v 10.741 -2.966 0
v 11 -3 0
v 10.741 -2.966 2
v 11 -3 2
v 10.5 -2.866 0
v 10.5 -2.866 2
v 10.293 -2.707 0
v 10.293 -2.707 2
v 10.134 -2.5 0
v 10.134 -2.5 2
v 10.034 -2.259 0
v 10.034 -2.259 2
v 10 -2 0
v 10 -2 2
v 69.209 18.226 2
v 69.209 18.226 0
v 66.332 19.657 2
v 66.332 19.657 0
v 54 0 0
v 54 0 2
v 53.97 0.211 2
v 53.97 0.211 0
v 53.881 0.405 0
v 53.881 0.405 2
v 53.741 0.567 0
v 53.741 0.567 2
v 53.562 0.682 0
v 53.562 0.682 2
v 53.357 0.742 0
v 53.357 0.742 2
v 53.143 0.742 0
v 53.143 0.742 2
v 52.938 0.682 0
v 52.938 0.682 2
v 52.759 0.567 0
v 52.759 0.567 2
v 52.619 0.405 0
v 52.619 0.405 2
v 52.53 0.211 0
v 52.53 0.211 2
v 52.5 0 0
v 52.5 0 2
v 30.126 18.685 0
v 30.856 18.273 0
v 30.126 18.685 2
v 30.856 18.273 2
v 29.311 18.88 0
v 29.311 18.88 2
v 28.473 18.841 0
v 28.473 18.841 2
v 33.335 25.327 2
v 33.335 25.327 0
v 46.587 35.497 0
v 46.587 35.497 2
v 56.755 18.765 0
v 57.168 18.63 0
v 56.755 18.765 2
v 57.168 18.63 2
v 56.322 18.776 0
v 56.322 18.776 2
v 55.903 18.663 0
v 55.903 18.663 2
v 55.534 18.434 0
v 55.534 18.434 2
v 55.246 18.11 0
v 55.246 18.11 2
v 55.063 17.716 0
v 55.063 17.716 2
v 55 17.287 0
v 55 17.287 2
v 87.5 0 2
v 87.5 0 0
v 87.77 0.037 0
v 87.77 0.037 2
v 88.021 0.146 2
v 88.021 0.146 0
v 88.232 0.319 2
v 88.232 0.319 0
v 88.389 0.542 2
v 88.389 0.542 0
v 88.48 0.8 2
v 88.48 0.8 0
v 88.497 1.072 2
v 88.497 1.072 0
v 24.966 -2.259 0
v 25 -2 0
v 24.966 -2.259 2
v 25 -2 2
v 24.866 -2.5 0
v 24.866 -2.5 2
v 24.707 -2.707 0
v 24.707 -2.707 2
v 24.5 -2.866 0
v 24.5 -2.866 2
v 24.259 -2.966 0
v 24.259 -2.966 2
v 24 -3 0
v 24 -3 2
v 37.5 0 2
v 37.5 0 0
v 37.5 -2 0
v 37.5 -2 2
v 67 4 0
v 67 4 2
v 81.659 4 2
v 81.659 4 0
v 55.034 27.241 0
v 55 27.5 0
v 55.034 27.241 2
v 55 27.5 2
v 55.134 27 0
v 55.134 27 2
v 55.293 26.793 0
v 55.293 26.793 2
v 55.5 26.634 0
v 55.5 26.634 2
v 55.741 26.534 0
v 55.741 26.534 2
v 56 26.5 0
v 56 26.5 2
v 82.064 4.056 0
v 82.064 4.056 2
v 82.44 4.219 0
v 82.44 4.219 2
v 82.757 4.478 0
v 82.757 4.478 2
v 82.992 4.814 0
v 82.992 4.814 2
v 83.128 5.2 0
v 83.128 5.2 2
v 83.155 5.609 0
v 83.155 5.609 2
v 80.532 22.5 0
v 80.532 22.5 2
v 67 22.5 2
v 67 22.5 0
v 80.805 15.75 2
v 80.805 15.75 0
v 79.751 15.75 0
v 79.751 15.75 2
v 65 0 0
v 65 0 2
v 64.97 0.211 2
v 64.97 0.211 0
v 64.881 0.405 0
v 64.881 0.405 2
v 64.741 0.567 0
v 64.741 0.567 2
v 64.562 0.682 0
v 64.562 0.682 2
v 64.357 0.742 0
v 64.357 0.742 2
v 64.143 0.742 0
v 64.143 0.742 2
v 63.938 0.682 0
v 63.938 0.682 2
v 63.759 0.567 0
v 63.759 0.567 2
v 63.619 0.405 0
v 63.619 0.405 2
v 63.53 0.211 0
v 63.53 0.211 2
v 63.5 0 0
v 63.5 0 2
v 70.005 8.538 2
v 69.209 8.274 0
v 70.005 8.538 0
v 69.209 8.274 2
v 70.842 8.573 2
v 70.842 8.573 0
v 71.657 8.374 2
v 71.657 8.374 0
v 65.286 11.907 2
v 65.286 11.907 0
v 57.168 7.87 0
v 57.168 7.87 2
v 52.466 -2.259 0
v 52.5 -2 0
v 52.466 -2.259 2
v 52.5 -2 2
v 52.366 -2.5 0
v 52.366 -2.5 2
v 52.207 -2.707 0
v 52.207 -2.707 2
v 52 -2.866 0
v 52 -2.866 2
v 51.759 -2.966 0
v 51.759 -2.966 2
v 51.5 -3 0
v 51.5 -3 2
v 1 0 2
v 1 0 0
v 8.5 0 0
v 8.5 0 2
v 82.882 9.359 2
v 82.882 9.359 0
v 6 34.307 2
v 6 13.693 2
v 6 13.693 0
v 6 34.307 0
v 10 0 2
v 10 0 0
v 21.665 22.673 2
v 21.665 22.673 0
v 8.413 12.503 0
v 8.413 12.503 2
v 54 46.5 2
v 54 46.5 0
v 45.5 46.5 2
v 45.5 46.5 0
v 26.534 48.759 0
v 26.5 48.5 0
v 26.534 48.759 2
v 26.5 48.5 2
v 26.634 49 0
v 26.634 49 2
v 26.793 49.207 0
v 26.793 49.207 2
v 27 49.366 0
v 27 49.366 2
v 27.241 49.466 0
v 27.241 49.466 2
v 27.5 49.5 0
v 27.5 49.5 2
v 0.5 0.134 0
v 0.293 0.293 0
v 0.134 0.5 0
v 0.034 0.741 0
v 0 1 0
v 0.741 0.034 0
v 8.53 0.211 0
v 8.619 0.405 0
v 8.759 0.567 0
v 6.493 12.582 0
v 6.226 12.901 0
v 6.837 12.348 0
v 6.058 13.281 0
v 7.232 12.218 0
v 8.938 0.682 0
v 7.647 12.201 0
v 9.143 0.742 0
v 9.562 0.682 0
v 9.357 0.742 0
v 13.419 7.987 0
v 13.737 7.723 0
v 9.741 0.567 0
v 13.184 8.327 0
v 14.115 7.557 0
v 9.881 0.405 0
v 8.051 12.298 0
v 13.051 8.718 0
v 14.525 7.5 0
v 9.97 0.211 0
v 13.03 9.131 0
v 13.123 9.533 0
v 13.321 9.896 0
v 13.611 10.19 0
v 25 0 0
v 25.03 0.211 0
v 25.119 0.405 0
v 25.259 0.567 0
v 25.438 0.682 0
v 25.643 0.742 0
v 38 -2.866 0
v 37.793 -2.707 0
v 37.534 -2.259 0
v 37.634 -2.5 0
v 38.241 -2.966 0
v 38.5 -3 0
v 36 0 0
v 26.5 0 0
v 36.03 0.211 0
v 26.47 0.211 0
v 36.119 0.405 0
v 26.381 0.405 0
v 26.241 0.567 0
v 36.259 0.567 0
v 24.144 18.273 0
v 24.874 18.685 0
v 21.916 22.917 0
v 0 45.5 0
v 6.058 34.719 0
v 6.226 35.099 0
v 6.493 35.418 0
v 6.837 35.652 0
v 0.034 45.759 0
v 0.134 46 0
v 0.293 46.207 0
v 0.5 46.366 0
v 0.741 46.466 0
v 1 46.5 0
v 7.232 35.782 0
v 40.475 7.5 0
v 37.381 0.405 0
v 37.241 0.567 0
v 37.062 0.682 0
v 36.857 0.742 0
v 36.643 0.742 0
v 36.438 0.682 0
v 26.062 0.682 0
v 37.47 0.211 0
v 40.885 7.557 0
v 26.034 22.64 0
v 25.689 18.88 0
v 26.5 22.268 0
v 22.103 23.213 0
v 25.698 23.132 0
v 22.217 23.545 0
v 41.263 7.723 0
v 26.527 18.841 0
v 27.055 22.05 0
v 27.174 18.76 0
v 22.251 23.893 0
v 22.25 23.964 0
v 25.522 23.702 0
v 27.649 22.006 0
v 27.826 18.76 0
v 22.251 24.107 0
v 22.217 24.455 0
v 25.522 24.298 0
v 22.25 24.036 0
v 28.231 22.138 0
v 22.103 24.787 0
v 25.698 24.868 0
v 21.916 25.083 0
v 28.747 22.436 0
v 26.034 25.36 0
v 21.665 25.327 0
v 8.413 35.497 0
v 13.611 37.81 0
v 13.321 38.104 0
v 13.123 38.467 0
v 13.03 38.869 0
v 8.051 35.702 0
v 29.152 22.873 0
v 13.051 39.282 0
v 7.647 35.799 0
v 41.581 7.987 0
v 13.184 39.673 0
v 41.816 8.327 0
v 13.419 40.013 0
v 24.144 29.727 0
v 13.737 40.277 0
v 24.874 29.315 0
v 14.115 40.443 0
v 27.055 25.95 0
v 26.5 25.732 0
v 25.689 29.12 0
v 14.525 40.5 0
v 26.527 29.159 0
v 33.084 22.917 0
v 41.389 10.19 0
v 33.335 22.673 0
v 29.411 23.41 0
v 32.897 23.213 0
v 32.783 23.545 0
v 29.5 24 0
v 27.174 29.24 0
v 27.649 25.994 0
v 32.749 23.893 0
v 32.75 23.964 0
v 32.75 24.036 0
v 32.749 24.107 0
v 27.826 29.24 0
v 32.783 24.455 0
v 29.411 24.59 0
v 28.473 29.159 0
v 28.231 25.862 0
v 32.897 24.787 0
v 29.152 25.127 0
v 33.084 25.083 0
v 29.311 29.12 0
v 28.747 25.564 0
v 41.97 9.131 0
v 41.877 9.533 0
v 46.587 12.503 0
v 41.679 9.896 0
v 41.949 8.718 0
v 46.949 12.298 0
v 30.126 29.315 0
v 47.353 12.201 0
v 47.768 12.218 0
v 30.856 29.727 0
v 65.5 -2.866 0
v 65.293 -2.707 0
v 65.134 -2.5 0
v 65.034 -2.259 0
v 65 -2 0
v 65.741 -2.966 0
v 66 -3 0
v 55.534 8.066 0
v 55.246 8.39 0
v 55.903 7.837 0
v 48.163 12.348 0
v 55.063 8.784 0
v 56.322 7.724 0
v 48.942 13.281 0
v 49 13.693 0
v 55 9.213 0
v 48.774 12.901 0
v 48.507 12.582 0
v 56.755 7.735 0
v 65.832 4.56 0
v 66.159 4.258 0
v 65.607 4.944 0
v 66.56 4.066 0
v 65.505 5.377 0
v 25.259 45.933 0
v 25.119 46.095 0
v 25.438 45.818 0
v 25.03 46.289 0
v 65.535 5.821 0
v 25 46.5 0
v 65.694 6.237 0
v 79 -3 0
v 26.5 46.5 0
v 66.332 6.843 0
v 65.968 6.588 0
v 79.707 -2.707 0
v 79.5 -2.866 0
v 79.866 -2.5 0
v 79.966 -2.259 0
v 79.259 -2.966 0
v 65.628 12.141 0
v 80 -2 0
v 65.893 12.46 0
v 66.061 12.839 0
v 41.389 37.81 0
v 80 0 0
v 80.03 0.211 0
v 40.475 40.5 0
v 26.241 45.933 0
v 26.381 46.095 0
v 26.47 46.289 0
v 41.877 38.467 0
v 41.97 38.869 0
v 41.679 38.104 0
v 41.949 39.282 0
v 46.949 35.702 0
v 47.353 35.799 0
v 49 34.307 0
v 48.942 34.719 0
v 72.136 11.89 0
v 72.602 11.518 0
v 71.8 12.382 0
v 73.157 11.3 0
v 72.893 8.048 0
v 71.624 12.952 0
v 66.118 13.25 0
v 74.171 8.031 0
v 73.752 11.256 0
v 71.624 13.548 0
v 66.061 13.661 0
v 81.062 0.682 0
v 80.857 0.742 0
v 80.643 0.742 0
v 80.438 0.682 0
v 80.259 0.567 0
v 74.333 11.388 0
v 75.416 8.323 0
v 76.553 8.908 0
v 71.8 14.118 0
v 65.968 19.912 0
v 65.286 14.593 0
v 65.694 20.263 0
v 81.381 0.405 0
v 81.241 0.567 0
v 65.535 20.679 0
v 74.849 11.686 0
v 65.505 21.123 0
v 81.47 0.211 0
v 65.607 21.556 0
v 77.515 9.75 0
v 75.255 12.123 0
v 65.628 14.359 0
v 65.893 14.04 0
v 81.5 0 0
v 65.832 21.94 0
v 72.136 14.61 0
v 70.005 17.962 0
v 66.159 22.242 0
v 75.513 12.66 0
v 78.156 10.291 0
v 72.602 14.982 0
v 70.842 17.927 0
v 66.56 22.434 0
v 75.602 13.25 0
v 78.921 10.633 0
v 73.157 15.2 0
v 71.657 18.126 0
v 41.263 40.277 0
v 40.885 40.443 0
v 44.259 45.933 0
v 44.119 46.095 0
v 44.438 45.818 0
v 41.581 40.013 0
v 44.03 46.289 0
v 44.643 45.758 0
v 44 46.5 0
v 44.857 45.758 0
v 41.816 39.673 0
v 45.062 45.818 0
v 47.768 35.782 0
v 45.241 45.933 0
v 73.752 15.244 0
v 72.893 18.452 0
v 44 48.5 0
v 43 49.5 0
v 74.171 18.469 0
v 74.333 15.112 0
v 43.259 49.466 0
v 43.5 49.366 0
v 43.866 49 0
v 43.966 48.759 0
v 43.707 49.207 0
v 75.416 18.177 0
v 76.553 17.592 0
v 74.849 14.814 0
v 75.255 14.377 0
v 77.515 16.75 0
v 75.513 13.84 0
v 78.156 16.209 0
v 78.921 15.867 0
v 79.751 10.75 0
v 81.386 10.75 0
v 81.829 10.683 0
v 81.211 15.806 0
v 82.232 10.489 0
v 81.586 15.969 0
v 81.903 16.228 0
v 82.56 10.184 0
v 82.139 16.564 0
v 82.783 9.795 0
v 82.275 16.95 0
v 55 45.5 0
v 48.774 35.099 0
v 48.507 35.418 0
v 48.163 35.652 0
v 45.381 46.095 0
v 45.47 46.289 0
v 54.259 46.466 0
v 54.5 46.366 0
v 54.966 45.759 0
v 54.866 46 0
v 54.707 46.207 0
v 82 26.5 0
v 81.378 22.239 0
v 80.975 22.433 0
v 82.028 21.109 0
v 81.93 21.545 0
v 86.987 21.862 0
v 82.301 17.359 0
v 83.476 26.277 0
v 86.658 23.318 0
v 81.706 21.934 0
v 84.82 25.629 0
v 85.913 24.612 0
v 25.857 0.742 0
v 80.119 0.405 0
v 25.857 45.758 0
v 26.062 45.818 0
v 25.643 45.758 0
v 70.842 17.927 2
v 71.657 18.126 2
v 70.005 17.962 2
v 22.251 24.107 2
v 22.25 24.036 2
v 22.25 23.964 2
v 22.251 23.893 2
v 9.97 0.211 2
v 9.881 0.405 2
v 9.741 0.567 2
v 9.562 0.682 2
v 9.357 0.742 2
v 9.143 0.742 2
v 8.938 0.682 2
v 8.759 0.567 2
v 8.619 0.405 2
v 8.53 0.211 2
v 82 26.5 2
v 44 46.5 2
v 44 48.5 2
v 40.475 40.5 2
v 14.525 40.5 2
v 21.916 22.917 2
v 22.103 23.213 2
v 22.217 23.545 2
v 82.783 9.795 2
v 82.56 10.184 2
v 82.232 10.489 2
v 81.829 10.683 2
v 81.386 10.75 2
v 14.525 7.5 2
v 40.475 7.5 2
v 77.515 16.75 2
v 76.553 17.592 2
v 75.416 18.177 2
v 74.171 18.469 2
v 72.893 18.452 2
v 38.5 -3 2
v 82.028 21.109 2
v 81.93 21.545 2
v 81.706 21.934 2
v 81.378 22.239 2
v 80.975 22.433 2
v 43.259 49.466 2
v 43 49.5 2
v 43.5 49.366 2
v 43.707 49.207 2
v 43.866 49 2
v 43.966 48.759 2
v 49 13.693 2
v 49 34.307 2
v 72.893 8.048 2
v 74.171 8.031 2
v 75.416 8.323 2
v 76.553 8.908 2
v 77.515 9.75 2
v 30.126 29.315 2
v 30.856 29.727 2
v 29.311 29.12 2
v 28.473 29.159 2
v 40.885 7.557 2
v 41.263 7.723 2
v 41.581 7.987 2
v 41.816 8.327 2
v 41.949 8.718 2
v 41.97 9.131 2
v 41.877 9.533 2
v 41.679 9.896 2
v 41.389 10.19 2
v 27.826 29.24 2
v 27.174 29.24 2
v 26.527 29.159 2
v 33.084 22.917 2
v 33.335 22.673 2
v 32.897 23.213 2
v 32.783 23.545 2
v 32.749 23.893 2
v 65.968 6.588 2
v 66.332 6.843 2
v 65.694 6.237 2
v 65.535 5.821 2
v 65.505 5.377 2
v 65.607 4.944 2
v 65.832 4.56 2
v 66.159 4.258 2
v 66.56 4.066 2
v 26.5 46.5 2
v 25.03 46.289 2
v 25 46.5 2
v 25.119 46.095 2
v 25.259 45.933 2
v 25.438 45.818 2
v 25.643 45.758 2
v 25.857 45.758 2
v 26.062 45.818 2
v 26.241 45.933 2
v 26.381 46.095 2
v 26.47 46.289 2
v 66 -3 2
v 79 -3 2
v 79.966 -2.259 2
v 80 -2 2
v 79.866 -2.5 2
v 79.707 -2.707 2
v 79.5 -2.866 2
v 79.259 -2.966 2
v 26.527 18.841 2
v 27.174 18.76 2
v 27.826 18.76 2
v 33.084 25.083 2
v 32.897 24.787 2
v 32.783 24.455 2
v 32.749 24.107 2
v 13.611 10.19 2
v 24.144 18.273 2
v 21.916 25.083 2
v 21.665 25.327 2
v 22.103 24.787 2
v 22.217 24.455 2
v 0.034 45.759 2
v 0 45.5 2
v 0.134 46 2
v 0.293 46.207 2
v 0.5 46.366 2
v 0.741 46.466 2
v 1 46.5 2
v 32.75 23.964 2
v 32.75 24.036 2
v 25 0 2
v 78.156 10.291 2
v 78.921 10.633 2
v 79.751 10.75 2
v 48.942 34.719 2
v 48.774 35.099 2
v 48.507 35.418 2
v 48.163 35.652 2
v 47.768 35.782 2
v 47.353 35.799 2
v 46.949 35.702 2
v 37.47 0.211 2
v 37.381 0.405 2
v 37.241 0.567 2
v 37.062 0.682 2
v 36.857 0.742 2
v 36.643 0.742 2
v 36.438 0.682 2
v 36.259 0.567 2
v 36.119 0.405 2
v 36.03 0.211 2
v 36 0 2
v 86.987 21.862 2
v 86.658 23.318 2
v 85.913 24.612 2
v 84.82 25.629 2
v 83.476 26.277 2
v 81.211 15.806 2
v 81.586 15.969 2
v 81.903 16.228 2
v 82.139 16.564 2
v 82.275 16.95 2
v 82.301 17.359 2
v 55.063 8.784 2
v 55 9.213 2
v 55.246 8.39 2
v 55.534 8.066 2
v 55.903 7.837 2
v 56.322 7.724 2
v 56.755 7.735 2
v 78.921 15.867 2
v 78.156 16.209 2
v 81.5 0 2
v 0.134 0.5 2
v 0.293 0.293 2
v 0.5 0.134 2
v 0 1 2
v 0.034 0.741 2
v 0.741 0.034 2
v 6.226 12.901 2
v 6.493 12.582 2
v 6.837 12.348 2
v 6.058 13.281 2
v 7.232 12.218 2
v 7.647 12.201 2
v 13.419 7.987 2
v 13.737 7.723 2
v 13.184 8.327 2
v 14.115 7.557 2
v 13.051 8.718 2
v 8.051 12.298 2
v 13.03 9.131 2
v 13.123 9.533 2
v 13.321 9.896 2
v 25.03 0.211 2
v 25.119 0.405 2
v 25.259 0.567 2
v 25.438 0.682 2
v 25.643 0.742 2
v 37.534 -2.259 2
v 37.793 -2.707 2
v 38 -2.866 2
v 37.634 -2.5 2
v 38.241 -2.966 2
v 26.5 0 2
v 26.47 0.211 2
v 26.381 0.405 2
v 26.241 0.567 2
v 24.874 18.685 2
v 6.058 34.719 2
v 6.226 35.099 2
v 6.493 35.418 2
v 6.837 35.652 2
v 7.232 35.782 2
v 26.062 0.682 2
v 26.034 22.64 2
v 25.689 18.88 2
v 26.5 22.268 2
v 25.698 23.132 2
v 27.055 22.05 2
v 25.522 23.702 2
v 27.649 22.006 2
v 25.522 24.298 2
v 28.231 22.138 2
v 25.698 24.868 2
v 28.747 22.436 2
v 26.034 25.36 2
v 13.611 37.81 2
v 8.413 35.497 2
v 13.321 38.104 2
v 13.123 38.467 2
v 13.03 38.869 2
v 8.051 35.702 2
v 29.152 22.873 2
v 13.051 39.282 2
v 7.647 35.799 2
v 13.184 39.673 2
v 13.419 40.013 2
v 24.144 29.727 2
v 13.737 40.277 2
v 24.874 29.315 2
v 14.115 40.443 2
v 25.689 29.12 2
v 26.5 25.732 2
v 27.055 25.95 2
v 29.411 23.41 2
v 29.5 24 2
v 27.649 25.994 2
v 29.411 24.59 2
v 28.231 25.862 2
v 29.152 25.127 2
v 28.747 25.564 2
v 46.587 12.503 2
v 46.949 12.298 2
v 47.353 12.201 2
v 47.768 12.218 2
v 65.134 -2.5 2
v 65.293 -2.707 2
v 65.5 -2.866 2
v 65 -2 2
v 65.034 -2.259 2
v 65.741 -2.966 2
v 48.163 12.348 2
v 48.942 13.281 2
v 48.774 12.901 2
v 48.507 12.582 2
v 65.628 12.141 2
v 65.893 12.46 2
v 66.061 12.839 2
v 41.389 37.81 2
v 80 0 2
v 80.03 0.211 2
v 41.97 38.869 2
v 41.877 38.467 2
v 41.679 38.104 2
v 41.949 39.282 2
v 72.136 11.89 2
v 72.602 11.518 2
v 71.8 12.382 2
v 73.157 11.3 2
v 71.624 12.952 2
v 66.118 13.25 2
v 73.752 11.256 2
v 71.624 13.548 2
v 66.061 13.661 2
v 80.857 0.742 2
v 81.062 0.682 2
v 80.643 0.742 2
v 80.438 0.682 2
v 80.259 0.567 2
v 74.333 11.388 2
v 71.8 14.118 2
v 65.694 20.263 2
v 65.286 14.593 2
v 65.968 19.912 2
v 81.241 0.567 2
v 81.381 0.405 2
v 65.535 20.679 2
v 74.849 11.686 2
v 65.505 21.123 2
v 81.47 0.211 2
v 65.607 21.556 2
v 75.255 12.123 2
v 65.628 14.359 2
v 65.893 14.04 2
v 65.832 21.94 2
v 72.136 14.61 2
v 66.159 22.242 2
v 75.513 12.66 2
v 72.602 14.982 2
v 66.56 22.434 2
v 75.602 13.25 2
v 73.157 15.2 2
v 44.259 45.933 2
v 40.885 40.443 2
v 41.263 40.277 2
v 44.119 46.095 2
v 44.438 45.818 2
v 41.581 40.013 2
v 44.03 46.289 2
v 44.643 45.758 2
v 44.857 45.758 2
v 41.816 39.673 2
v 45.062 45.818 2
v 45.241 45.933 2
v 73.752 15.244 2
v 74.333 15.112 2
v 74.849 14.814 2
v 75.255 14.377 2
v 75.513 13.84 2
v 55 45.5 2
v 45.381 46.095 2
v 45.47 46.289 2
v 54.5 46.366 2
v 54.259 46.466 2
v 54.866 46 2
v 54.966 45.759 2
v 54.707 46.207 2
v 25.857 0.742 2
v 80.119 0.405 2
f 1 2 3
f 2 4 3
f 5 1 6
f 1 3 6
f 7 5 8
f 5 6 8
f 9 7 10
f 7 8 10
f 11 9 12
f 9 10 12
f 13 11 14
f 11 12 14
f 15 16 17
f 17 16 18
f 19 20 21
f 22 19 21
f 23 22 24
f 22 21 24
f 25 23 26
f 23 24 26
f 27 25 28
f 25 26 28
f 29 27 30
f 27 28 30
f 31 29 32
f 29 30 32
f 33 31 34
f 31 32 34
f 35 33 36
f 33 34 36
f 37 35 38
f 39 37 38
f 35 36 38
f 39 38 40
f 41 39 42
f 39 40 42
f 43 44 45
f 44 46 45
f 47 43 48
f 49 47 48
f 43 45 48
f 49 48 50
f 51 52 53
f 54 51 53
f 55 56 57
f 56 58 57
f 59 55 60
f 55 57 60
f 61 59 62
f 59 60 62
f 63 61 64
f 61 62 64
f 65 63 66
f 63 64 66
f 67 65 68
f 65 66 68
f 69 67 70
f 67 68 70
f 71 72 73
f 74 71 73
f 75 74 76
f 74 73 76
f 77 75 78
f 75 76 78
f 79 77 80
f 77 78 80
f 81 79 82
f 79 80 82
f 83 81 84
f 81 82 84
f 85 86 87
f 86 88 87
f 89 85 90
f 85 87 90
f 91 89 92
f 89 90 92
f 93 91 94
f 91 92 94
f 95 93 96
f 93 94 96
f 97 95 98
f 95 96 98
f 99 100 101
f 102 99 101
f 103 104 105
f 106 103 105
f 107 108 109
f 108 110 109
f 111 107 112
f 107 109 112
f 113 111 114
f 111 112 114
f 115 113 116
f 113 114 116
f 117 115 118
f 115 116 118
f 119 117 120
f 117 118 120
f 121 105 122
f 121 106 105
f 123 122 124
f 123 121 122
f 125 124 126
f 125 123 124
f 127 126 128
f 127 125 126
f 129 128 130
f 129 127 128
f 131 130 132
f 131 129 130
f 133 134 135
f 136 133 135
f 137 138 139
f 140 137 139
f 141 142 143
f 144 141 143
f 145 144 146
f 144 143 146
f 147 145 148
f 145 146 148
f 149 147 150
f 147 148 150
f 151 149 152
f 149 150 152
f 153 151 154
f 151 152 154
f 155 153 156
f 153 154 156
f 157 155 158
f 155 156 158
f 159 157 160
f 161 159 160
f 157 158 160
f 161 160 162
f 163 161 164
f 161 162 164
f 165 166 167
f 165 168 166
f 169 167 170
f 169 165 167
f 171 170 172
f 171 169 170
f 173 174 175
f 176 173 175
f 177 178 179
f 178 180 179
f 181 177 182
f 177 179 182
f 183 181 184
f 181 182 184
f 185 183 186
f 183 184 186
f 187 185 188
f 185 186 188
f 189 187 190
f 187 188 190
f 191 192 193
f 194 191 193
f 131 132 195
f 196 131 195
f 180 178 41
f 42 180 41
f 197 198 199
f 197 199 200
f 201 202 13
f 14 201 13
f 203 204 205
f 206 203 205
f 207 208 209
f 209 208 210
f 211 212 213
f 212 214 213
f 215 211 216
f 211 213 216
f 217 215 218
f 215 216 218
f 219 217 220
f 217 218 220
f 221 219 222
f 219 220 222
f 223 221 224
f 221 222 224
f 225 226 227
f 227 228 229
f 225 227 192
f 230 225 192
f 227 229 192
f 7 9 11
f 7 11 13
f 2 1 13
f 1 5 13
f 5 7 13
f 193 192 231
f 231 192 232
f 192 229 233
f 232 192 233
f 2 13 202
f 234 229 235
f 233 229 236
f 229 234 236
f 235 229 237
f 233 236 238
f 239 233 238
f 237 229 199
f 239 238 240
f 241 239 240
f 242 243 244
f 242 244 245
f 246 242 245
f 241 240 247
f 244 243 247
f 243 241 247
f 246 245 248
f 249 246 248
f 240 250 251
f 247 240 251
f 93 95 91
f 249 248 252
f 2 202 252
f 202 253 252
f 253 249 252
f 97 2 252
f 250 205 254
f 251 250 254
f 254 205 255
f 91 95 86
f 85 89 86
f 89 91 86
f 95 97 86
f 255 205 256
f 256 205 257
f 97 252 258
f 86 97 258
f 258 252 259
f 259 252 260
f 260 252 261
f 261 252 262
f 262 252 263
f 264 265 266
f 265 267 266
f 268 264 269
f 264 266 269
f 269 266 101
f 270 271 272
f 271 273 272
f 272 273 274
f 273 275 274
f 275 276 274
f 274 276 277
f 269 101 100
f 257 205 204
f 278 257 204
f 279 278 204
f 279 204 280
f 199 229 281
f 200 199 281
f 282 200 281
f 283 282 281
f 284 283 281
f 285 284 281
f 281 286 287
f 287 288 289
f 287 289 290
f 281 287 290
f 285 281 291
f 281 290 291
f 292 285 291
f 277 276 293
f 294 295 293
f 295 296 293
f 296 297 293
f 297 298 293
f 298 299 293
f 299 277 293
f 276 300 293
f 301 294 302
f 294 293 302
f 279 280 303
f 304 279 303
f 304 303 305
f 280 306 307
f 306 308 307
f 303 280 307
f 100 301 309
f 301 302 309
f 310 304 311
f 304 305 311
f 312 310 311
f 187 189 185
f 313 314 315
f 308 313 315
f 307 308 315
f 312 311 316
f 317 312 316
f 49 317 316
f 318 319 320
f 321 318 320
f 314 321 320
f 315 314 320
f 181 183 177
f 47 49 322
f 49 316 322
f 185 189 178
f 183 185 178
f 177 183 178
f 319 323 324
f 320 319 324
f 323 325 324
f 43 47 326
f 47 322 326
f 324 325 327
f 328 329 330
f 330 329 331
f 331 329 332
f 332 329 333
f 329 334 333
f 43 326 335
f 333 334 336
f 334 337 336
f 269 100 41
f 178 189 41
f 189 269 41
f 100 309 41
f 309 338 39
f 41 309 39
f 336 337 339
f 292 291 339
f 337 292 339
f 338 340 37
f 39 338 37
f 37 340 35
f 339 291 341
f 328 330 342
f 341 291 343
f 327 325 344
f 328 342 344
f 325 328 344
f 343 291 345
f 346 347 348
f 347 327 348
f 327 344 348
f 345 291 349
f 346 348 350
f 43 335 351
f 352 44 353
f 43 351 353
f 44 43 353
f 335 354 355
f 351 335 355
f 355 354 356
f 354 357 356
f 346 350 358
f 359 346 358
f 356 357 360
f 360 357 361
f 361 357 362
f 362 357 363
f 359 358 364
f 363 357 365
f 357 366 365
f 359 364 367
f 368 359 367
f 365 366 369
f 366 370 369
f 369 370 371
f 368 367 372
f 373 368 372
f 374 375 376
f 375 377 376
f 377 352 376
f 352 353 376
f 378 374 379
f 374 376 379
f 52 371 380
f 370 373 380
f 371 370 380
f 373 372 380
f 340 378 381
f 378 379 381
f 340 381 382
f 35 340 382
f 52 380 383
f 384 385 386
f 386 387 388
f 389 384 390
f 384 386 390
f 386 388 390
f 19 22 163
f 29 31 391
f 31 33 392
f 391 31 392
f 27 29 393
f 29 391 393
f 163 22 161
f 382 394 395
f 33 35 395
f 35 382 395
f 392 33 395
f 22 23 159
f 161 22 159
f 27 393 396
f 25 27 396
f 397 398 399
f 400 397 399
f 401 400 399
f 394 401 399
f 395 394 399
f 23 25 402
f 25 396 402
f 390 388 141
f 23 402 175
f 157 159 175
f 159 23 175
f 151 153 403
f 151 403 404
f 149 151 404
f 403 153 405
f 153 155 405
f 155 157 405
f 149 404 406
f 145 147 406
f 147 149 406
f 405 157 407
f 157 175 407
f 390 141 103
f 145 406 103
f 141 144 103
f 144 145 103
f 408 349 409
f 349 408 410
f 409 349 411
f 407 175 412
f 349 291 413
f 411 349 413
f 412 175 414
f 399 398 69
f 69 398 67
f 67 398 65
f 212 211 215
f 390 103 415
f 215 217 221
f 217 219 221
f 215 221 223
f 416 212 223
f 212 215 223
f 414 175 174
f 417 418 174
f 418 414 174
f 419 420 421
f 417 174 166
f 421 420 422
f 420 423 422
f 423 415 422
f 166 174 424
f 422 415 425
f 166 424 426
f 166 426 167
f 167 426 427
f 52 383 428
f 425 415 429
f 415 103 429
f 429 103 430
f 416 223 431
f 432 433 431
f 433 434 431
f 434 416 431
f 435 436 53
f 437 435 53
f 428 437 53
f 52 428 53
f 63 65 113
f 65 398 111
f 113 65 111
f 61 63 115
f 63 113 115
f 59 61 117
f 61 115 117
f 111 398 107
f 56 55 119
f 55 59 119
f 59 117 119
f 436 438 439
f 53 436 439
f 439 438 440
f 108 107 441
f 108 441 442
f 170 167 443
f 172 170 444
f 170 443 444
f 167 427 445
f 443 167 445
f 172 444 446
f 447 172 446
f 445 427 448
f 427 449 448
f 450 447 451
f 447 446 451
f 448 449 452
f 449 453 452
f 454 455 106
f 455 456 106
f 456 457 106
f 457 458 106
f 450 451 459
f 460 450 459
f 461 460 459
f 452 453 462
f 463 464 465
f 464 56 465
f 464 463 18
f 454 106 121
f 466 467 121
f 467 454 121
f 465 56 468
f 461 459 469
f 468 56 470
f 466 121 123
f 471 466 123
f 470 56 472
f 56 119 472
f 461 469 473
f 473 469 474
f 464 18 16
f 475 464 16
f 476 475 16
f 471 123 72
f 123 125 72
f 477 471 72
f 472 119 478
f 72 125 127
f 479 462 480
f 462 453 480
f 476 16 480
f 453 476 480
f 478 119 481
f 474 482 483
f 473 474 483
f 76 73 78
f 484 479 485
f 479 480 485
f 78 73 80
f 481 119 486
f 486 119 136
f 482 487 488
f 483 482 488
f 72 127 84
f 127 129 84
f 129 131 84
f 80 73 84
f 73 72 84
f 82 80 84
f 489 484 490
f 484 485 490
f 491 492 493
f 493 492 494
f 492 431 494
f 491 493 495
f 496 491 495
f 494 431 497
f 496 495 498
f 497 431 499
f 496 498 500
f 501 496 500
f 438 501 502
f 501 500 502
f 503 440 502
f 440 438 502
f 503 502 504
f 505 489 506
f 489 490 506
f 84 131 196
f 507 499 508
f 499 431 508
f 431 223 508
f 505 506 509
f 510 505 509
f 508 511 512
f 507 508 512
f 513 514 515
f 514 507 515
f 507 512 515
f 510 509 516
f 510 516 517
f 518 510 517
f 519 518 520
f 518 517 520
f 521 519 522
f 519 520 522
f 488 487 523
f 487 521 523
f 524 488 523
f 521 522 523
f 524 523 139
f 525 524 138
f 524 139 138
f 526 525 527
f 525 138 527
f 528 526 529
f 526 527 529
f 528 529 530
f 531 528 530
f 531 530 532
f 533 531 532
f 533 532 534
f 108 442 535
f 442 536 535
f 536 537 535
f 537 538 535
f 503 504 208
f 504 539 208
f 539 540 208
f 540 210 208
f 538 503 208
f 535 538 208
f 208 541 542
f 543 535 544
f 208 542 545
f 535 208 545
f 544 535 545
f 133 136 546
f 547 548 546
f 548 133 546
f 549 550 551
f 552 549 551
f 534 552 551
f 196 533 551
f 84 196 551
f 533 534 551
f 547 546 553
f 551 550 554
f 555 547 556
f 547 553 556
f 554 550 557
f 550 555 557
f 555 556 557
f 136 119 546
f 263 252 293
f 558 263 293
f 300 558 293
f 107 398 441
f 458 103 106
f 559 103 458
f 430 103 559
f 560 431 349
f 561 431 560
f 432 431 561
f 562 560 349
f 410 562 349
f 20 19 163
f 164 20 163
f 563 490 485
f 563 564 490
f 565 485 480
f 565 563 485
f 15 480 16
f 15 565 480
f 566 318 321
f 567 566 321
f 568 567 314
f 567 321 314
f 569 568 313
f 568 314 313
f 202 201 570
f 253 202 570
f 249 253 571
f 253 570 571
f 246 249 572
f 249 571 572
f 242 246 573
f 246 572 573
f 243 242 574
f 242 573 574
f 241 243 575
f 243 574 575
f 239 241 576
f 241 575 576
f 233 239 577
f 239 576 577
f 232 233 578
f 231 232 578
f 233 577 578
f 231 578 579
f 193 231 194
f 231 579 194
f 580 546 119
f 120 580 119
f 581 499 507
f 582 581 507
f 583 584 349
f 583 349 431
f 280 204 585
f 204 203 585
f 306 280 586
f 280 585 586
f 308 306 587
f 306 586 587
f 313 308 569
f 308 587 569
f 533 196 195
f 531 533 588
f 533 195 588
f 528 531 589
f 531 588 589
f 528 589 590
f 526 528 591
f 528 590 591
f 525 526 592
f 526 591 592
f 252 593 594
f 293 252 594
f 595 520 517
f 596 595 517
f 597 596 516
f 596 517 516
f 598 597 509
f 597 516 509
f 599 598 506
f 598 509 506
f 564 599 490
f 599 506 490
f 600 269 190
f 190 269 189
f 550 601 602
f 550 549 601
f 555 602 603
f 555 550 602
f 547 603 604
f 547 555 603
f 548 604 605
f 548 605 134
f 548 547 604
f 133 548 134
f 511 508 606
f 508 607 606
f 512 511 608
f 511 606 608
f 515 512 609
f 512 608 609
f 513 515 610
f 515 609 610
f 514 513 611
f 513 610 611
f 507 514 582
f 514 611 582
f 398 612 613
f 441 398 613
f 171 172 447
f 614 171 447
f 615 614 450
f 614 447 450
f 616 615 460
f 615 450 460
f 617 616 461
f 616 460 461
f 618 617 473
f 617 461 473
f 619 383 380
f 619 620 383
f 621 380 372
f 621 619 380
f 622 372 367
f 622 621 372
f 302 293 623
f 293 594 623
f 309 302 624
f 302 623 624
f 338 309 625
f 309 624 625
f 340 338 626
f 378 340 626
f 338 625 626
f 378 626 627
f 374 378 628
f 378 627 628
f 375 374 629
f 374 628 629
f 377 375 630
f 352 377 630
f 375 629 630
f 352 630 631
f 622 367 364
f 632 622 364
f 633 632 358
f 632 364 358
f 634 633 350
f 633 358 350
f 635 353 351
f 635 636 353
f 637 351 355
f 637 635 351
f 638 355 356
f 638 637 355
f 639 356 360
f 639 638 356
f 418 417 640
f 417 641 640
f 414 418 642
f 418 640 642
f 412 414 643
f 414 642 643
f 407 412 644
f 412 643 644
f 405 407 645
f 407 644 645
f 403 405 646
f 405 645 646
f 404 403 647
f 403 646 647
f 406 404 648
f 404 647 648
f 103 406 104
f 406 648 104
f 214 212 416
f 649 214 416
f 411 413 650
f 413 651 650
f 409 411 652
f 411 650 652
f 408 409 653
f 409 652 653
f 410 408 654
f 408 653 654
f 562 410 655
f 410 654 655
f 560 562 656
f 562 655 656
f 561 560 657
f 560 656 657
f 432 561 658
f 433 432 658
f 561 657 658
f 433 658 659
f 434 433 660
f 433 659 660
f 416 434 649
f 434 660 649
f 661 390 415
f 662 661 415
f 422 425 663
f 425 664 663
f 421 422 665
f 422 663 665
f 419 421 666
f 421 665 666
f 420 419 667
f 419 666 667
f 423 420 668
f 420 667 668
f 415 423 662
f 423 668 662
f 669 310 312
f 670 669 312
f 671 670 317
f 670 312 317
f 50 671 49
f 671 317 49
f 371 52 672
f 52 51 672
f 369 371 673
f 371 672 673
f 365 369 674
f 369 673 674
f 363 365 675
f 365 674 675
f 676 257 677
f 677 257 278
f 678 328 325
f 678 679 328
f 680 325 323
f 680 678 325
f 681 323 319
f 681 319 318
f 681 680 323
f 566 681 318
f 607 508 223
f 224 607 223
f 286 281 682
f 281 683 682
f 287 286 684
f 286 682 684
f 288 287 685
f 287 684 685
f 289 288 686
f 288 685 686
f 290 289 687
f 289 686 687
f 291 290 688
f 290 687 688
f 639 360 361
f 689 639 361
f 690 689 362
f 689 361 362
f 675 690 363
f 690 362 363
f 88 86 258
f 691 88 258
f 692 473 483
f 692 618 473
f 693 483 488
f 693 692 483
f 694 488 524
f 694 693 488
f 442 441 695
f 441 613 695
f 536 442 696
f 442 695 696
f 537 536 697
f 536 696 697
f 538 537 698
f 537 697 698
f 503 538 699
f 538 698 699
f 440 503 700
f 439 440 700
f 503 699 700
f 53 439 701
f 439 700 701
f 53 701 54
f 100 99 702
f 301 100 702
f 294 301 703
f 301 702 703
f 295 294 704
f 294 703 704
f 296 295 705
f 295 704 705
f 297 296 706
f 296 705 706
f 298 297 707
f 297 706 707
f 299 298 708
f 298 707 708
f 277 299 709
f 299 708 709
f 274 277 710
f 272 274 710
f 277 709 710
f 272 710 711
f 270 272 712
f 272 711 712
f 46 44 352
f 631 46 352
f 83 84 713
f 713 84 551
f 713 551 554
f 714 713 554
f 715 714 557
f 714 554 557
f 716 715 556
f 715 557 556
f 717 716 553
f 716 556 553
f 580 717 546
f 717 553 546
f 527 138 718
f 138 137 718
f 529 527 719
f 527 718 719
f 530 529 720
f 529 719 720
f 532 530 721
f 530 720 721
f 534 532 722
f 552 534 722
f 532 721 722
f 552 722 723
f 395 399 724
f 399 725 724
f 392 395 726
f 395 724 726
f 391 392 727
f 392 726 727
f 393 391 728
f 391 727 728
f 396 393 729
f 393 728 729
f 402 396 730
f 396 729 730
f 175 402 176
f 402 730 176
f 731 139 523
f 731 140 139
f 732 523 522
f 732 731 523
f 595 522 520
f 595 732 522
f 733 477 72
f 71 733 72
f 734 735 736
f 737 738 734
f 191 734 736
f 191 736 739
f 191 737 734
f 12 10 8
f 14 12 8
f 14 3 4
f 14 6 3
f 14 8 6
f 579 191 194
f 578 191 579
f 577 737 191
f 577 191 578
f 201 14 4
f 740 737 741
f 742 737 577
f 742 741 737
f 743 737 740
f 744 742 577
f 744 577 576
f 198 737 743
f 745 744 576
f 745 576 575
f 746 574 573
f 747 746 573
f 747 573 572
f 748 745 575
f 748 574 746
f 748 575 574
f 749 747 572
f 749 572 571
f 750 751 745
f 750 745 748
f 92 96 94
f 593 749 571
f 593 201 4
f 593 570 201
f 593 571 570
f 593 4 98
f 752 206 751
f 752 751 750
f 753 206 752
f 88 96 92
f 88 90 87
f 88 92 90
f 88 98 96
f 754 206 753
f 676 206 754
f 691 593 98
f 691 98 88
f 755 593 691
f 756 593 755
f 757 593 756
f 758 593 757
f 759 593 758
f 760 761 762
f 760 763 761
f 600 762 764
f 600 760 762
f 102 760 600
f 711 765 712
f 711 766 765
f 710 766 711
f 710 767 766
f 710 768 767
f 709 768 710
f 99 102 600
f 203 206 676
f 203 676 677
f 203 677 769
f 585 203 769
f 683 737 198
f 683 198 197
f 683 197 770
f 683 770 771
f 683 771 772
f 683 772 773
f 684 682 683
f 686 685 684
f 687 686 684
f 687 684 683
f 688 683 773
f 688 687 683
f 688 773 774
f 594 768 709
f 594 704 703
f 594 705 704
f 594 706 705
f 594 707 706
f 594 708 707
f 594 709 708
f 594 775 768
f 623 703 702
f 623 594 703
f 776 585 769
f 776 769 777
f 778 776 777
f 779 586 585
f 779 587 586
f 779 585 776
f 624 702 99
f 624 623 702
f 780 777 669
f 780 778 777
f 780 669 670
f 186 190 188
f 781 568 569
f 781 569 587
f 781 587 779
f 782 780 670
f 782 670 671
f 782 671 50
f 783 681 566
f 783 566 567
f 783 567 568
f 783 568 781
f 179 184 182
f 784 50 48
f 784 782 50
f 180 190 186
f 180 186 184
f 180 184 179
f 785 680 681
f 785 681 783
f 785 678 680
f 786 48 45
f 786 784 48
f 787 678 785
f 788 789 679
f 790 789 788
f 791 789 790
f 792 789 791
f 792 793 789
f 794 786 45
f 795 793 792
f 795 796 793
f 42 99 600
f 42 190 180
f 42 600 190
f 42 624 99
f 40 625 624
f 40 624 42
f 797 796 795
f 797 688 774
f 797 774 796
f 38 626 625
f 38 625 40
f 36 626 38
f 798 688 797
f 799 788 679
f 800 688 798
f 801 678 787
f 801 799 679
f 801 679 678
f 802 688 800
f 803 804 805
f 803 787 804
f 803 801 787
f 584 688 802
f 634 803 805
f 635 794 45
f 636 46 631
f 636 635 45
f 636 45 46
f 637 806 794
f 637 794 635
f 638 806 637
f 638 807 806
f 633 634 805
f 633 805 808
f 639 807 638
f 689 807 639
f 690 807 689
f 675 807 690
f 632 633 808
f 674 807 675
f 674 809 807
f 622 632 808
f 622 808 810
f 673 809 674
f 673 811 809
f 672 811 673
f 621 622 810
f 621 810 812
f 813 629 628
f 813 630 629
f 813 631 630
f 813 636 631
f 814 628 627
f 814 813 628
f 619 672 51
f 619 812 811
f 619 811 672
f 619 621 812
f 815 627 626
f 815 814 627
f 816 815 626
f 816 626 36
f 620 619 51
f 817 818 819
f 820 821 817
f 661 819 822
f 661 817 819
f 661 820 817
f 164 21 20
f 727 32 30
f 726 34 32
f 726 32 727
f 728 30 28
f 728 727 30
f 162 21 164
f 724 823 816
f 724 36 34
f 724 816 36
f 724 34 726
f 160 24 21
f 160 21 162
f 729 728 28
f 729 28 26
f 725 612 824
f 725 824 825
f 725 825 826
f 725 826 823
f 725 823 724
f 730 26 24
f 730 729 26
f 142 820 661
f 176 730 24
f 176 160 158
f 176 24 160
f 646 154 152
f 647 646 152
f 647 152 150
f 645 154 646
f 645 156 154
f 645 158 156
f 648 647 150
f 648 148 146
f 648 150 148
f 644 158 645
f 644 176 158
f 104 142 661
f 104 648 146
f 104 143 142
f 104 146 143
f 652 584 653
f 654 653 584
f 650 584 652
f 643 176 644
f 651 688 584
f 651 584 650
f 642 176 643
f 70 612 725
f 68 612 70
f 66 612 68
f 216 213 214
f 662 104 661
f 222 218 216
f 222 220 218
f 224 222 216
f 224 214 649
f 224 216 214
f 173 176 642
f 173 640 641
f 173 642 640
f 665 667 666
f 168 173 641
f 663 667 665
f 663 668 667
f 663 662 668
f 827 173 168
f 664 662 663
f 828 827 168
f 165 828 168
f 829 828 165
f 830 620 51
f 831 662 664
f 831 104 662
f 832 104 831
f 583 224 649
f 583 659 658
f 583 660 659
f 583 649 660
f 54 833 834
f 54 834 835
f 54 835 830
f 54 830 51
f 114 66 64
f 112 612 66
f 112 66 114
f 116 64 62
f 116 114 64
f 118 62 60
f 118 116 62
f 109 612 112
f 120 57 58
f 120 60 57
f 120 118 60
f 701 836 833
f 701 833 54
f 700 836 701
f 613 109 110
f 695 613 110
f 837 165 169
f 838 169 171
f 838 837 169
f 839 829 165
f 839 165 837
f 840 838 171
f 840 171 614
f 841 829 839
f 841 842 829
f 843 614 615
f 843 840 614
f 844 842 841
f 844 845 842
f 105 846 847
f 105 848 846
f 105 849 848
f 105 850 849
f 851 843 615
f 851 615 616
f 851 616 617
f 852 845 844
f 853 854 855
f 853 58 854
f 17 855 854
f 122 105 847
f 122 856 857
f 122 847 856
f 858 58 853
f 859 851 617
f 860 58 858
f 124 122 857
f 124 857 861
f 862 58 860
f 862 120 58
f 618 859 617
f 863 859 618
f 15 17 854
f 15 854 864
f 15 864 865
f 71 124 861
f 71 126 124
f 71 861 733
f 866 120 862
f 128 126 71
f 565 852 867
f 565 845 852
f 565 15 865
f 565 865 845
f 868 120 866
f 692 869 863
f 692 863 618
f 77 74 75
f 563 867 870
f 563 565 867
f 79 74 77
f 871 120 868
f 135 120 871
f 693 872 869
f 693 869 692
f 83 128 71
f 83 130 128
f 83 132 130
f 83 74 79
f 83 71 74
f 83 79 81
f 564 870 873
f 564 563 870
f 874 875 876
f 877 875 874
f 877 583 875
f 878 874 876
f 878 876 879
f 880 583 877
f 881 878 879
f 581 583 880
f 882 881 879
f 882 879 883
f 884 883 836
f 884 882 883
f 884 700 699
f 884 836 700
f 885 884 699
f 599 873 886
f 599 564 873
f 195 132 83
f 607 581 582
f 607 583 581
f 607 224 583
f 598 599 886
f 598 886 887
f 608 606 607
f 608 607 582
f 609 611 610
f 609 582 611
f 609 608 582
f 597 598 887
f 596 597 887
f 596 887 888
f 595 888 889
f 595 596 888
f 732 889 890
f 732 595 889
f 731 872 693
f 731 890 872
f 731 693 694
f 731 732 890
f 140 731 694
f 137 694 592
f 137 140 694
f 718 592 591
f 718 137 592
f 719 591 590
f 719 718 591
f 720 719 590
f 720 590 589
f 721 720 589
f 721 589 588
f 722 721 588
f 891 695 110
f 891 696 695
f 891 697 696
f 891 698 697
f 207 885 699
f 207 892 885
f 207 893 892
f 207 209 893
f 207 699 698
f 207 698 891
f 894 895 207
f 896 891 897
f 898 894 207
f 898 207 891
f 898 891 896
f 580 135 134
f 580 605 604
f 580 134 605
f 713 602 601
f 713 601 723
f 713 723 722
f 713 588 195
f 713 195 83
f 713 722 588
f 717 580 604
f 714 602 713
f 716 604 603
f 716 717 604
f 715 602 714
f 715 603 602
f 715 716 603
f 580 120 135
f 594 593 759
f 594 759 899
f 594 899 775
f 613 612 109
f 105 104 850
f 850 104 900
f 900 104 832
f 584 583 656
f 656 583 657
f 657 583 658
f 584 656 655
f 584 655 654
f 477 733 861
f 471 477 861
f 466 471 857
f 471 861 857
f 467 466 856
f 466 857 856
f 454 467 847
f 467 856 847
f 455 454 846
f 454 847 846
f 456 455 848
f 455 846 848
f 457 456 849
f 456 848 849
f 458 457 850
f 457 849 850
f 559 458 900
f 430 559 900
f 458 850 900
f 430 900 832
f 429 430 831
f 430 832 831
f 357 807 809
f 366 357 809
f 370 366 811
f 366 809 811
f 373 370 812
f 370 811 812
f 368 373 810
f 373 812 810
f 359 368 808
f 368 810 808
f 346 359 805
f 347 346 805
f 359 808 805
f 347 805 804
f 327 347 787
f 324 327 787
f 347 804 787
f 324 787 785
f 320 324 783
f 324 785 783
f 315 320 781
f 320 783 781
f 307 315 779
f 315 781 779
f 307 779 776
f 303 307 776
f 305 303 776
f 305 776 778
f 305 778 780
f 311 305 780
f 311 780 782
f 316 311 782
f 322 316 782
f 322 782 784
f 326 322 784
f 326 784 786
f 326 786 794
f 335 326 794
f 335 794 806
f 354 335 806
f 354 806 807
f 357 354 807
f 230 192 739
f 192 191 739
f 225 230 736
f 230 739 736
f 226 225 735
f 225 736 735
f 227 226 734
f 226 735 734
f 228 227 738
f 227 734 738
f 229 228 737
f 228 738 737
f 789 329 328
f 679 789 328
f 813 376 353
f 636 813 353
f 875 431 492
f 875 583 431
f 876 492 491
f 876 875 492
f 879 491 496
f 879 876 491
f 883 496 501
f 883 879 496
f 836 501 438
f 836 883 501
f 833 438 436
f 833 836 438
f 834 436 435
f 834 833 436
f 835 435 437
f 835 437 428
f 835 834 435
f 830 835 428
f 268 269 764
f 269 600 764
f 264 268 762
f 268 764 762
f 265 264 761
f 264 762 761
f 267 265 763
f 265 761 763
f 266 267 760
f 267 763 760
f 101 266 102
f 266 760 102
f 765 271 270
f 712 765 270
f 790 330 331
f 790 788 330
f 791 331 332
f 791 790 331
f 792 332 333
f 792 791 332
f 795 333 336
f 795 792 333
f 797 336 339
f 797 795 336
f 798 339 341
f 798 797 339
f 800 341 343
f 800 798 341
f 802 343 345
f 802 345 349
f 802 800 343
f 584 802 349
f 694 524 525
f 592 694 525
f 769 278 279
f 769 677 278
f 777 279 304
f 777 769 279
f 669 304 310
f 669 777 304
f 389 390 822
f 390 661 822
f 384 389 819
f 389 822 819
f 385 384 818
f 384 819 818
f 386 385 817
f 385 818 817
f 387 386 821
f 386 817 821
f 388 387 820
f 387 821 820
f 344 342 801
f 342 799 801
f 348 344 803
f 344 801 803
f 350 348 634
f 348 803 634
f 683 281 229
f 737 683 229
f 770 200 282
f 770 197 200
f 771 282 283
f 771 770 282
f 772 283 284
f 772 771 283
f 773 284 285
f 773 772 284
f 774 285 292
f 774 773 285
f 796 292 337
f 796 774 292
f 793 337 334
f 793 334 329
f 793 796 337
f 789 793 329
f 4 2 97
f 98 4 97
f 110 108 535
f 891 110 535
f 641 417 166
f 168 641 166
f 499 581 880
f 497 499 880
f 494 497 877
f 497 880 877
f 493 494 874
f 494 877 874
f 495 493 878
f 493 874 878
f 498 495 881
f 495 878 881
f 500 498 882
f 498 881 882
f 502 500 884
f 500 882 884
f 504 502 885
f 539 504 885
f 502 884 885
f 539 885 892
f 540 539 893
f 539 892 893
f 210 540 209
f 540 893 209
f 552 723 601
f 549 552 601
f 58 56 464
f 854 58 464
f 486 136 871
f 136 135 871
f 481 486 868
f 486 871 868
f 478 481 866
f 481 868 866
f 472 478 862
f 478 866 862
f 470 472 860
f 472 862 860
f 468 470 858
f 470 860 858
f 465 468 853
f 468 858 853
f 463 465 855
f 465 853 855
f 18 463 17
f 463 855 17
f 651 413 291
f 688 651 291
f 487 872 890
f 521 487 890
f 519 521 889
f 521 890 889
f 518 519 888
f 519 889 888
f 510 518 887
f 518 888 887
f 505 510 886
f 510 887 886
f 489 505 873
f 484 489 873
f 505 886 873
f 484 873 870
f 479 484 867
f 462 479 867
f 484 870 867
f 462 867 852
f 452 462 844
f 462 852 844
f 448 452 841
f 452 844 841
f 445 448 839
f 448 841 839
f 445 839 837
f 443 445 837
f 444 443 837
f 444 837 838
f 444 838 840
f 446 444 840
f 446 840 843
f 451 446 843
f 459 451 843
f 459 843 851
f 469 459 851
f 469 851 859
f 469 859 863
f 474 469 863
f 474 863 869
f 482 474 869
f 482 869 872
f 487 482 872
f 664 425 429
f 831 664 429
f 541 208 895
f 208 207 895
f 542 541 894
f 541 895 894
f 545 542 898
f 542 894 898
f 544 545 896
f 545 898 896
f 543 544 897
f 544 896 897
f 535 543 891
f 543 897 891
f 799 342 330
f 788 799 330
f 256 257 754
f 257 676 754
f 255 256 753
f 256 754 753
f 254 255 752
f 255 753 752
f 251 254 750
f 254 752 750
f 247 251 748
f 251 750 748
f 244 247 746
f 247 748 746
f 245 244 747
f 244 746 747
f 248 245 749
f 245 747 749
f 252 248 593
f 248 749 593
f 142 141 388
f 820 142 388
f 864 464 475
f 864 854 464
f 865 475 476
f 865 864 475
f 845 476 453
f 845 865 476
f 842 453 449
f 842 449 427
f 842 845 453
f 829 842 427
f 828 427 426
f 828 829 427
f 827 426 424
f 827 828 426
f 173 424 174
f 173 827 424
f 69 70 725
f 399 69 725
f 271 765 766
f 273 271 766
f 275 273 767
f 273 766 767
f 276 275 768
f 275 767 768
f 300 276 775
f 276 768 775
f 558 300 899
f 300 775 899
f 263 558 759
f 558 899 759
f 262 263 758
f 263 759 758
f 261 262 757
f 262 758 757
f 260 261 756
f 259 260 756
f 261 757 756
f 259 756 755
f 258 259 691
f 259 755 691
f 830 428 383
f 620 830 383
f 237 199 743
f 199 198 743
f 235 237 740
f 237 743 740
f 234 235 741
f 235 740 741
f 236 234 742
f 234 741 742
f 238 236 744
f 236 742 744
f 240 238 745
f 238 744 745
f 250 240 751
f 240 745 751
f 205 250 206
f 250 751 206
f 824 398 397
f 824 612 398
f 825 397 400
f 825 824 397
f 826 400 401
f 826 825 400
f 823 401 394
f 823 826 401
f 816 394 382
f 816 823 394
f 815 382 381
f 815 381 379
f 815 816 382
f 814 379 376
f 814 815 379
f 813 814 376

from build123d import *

# Parameters (mm, degrees)
EXTRUDE_1_DEPTH     = 2
SKETCH_2_R          = 0.75
SKETCH_2_W          = 43
SKETCH_2_H          = 33
CUT_EXTRUDE_1_DEPTH = 102.422384117
EXTRUDE_START       = -2
EXTRUDE_1_2_DEPTH   = 2
FILLET_1_R          = 1
SKETCH_4_R          = 2
CUT_EXTRUDE_2_DEPTH = 102.422384117
FILLET_2_R          = 3
FILLET_3_R          = 1.5


# Read off the part's stored shape, not the designer's step: 拉伸-薄壁1
with BuildPart() as part:
    # 草图1 → Extrude 1 (new body)
    with BuildSketch(Plane.XY):
        with BuildLine():
            Line((88.497370929, 1.072465371), (86.986854645, 21.862326856))
            ThreePointArc((86.986854645, 21.862326856), (85.405023181, 25.161395518), (82, 26.5))
            Line((82, 26.5), (55, 26.5))
            Line((55, 26.5), (55, 46.5))
            Line((55, 46.5), (44, 46.5))
            Line((44, 46.5), (44, 49.5))
            Line((44, 49.5), (26.5, 49.5))
            Line((26.5, 49.5), (26.5, 46.5))
            Line((26.5, 46.5), (0, 46.5))
            Line((0, 46.5), (0, 0))
            Line((0, 0), (10, 0))
            Line((10, 0), (10, -3))
            Line((10, -3), (25, -3))
            Line((25, -3), (25, 0))
            Line((25, 0), (37.5, 0))
            Line((37.5, 0), (37.5, -3))
            Line((37.5, -3), (52.5, -3))
            Line((52.5, -3), (52.5, 0))
            Line((52.5, 0), (65, 0))
            Line((65, 0), (65, -3))
            Line((65, -3), (80, -3))
            Line((80, -3), (80, 0))
            Line((80, 0), (87.5, 0))
            ThreePointArc((87.5, 0), (88.232279104, 0.318995364), (88.497370929, 1.072465371))
        make_face()
    extrude(amount=EXTRUDE_1_DEPTH)

    # 草图2 → 切除-拉伸1 (cut, through all)
    with BuildSketch(Plane.XY.offset(2)):
        with Locations((9.25, 0)):
            Circle(SKETCH_2_R)
        with Locations((25.75, 0)):
            Circle(SKETCH_2_R)
        with Locations((36.75, 0)):
            Circle(SKETCH_2_R)
        with Locations((53.25, 0)):
            Circle(SKETCH_2_R)
        with Locations((64.25, 0)):
            Circle(SKETCH_2_R)
        with Locations((80.75, 0)):
            Circle(SKETCH_2_R)
        with Locations((25.75, 46.5)):
            Circle(SKETCH_2_R)
        with Locations((44.75, 46.5)):
            Circle(SKETCH_2_R)
        with Locations((27.5, 24)):
            Rectangle(SKETCH_2_W, SKETCH_2_H)
        Polygon((55, 4), (83.271486825, 4), (81.92734361, 22.5), (55, 22.5), align=None)
    extrude(amount=-CUT_EXTRUDE_1_DEPTH, mode=Mode.SUBTRACT)

    # Extrude 1 2 outline → Extrude 1 2 (add)
    with BuildSketch(Plane.XY.offset(2).offset(EXTRUDE_START)):
        with BuildLine():
            Line((55, 19.707975069), (67.987198163, 13.25))
            Line((67.987198163, 13.25), (55, 6.792024931))
            Line((55, 6.792024931), (55, 4))
            Line((55, 4), (60.614853056, 4))
            Line((60.614853056, 4), (70.581480185, 8.955975008))
            ThreePointArc((70.581480185, 8.955975008), (74.80264095, 8.139120986), (78.218597547, 10.75))
            Line((78.218597547, 10.75), (82.781056192, 10.75))
            Line((82.781056192, 10.75), (82.417774242, 15.75))
            Line((82.417774242, 15.75), (78.218597547, 15.75))
            ThreePointArc((78.218597547, 15.75), (74.80264095, 18.360879014), (70.581480185, 17.544024992))
            Line((70.581480185, 17.544024992), (60.614853056, 22.5))
            Line((60.614853056, 22.5), (55, 22.5))
            Line((55, 22.5), (55, 19.707975069))
        make_face()
        with BuildLine():
            Line((22.315603781, 23.172633188), (6, 10.651355868))
            Line((6, 10.651355868), (6, 7.5))
            Line((6, 7.5), (10.106312192, 7.5))
            Line((10.106312192, 7.5), (25.359697706, 19.206086558))
            ThreePointArc((25.359697706, 19.206086558), (27.5, 18.75), (29.640302294, 19.206086558))
            Line((29.640302294, 19.206086558), (44.893687808, 7.5))
            Line((44.893687808, 7.5), (49, 7.5))
            Line((49, 7.5), (49, 10.651355868))
            Line((49, 10.651355868), (32.684396219, 23.172633188))
            ThreePointArc((32.684396219, 23.172633188), (32.75, 24), (32.684396219, 24.827366812))
            Line((32.684396219, 24.827366812), (49, 37.348644132))
            Line((49, 37.348644132), (49, 40.5))
            Line((49, 40.5), (44.893687808, 40.5))
            Line((44.893687808, 40.5), (29.640302294, 28.793913442))
            ThreePointArc((29.640302294, 28.793913442), (27.5, 29.25), (25.359697706, 28.793913442))
            Line((25.359697706, 28.793913442), (10.106312192, 40.5))
            Line((10.106312192, 40.5), (6, 40.5))
            Line((6, 40.5), (6, 37.348644132))
            Line((6, 37.348644132), (22.315603781, 24.827366812))
            ThreePointArc((22.315603781, 24.827366812), (22.25, 24), (22.315603781, 23.172633188))
        make_face()
    extrude(amount=EXTRUDE_1_2_DEPTH)

    # 圆角1
    fillet_1_edges = [part.edges().sort_by_distance(p)[0] for p in [
        (52.5, -3, 1),
        (37.5, -3, 1),
        (25, -3, 1),
        (10, -3, 1),
        (0, 0, 1),
        (0, 46.5, 1),
        (26.5, 49.5, 1),
        (44, 49.5, 1),
        (55, 46.5, 1),
        (55, 26.5, 1),
        (80, -3, 1),
        (65, -3, 1),
    ]]
    fillet(fillet_1_edges, radius=FILLET_1_R)

    # 草图4 → 切除-拉伸2 (cut, through all)
    with BuildSketch(Plane.XY.offset(2)):
        with Locations((27.5, 24)):
            Circle(SKETCH_4_R)
        with Locations((73.602051219, 13.25)):
            Circle(SKETCH_4_R)
    extrude(amount=-CUT_EXTRUDE_2_DEPTH, mode=Mode.SUBTRACT)

    # 圆角2
    fillet_2_edges = [part.edges().sort_by_distance(p)[0] for p in [
        (70.581480185, 17.544024992, 1),
        (78.218597547, 15.75, 1),
        (70.581480185, 8.955975008, 1),
        (78.218597547, 10.75, 1),
        (29.640302294, 28.793913442, 1),
        (25.359697706, 28.793913442, 1),
        (29.640302294, 19.206086558, 1),
        (25.359697706, 19.206086558, 1),
    ]]
    fillet(fillet_2_edges, radius=FILLET_2_R)

    # 圆角3
    fillet_3_edges = [part.edges().sort_by_distance(p)[0] for p in [
        (81.92734361, 22.5, 1),
        (83.271486825, 4, 1),
        (60.614853056, 4, 1),
        (82.417774242, 15.75, 1),
        (82.781056192, 10.75, 1),
        (60.614853056, 22.5, 1),
        (55, 19.707975069, 1),
        (55, 6.792024931, 1),
        (67.987198163, 13.25, 1),
        (10.106312192, 7.5, 1),
        (44.893687808, 7.5, 1),
        (49, 37.348644132, 1),
        (49, 10.651355868, 1),
        (10.106312192, 40.5, 1),
        (44.893687808, 40.5, 1),
        (6, 37.348644132, 1),
        (6, 10.651355868, 1),
        (22.315603781, 23.172633188, 1),
        (32.684396219, 23.172633188, 1),
        (32.684396219, 24.827366812, 1),
        (22.315603781, 24.827366812, 1),
    ]]
    fillet(fillet_3_edges, radius=FILLET_3_R)


solid = part.part
